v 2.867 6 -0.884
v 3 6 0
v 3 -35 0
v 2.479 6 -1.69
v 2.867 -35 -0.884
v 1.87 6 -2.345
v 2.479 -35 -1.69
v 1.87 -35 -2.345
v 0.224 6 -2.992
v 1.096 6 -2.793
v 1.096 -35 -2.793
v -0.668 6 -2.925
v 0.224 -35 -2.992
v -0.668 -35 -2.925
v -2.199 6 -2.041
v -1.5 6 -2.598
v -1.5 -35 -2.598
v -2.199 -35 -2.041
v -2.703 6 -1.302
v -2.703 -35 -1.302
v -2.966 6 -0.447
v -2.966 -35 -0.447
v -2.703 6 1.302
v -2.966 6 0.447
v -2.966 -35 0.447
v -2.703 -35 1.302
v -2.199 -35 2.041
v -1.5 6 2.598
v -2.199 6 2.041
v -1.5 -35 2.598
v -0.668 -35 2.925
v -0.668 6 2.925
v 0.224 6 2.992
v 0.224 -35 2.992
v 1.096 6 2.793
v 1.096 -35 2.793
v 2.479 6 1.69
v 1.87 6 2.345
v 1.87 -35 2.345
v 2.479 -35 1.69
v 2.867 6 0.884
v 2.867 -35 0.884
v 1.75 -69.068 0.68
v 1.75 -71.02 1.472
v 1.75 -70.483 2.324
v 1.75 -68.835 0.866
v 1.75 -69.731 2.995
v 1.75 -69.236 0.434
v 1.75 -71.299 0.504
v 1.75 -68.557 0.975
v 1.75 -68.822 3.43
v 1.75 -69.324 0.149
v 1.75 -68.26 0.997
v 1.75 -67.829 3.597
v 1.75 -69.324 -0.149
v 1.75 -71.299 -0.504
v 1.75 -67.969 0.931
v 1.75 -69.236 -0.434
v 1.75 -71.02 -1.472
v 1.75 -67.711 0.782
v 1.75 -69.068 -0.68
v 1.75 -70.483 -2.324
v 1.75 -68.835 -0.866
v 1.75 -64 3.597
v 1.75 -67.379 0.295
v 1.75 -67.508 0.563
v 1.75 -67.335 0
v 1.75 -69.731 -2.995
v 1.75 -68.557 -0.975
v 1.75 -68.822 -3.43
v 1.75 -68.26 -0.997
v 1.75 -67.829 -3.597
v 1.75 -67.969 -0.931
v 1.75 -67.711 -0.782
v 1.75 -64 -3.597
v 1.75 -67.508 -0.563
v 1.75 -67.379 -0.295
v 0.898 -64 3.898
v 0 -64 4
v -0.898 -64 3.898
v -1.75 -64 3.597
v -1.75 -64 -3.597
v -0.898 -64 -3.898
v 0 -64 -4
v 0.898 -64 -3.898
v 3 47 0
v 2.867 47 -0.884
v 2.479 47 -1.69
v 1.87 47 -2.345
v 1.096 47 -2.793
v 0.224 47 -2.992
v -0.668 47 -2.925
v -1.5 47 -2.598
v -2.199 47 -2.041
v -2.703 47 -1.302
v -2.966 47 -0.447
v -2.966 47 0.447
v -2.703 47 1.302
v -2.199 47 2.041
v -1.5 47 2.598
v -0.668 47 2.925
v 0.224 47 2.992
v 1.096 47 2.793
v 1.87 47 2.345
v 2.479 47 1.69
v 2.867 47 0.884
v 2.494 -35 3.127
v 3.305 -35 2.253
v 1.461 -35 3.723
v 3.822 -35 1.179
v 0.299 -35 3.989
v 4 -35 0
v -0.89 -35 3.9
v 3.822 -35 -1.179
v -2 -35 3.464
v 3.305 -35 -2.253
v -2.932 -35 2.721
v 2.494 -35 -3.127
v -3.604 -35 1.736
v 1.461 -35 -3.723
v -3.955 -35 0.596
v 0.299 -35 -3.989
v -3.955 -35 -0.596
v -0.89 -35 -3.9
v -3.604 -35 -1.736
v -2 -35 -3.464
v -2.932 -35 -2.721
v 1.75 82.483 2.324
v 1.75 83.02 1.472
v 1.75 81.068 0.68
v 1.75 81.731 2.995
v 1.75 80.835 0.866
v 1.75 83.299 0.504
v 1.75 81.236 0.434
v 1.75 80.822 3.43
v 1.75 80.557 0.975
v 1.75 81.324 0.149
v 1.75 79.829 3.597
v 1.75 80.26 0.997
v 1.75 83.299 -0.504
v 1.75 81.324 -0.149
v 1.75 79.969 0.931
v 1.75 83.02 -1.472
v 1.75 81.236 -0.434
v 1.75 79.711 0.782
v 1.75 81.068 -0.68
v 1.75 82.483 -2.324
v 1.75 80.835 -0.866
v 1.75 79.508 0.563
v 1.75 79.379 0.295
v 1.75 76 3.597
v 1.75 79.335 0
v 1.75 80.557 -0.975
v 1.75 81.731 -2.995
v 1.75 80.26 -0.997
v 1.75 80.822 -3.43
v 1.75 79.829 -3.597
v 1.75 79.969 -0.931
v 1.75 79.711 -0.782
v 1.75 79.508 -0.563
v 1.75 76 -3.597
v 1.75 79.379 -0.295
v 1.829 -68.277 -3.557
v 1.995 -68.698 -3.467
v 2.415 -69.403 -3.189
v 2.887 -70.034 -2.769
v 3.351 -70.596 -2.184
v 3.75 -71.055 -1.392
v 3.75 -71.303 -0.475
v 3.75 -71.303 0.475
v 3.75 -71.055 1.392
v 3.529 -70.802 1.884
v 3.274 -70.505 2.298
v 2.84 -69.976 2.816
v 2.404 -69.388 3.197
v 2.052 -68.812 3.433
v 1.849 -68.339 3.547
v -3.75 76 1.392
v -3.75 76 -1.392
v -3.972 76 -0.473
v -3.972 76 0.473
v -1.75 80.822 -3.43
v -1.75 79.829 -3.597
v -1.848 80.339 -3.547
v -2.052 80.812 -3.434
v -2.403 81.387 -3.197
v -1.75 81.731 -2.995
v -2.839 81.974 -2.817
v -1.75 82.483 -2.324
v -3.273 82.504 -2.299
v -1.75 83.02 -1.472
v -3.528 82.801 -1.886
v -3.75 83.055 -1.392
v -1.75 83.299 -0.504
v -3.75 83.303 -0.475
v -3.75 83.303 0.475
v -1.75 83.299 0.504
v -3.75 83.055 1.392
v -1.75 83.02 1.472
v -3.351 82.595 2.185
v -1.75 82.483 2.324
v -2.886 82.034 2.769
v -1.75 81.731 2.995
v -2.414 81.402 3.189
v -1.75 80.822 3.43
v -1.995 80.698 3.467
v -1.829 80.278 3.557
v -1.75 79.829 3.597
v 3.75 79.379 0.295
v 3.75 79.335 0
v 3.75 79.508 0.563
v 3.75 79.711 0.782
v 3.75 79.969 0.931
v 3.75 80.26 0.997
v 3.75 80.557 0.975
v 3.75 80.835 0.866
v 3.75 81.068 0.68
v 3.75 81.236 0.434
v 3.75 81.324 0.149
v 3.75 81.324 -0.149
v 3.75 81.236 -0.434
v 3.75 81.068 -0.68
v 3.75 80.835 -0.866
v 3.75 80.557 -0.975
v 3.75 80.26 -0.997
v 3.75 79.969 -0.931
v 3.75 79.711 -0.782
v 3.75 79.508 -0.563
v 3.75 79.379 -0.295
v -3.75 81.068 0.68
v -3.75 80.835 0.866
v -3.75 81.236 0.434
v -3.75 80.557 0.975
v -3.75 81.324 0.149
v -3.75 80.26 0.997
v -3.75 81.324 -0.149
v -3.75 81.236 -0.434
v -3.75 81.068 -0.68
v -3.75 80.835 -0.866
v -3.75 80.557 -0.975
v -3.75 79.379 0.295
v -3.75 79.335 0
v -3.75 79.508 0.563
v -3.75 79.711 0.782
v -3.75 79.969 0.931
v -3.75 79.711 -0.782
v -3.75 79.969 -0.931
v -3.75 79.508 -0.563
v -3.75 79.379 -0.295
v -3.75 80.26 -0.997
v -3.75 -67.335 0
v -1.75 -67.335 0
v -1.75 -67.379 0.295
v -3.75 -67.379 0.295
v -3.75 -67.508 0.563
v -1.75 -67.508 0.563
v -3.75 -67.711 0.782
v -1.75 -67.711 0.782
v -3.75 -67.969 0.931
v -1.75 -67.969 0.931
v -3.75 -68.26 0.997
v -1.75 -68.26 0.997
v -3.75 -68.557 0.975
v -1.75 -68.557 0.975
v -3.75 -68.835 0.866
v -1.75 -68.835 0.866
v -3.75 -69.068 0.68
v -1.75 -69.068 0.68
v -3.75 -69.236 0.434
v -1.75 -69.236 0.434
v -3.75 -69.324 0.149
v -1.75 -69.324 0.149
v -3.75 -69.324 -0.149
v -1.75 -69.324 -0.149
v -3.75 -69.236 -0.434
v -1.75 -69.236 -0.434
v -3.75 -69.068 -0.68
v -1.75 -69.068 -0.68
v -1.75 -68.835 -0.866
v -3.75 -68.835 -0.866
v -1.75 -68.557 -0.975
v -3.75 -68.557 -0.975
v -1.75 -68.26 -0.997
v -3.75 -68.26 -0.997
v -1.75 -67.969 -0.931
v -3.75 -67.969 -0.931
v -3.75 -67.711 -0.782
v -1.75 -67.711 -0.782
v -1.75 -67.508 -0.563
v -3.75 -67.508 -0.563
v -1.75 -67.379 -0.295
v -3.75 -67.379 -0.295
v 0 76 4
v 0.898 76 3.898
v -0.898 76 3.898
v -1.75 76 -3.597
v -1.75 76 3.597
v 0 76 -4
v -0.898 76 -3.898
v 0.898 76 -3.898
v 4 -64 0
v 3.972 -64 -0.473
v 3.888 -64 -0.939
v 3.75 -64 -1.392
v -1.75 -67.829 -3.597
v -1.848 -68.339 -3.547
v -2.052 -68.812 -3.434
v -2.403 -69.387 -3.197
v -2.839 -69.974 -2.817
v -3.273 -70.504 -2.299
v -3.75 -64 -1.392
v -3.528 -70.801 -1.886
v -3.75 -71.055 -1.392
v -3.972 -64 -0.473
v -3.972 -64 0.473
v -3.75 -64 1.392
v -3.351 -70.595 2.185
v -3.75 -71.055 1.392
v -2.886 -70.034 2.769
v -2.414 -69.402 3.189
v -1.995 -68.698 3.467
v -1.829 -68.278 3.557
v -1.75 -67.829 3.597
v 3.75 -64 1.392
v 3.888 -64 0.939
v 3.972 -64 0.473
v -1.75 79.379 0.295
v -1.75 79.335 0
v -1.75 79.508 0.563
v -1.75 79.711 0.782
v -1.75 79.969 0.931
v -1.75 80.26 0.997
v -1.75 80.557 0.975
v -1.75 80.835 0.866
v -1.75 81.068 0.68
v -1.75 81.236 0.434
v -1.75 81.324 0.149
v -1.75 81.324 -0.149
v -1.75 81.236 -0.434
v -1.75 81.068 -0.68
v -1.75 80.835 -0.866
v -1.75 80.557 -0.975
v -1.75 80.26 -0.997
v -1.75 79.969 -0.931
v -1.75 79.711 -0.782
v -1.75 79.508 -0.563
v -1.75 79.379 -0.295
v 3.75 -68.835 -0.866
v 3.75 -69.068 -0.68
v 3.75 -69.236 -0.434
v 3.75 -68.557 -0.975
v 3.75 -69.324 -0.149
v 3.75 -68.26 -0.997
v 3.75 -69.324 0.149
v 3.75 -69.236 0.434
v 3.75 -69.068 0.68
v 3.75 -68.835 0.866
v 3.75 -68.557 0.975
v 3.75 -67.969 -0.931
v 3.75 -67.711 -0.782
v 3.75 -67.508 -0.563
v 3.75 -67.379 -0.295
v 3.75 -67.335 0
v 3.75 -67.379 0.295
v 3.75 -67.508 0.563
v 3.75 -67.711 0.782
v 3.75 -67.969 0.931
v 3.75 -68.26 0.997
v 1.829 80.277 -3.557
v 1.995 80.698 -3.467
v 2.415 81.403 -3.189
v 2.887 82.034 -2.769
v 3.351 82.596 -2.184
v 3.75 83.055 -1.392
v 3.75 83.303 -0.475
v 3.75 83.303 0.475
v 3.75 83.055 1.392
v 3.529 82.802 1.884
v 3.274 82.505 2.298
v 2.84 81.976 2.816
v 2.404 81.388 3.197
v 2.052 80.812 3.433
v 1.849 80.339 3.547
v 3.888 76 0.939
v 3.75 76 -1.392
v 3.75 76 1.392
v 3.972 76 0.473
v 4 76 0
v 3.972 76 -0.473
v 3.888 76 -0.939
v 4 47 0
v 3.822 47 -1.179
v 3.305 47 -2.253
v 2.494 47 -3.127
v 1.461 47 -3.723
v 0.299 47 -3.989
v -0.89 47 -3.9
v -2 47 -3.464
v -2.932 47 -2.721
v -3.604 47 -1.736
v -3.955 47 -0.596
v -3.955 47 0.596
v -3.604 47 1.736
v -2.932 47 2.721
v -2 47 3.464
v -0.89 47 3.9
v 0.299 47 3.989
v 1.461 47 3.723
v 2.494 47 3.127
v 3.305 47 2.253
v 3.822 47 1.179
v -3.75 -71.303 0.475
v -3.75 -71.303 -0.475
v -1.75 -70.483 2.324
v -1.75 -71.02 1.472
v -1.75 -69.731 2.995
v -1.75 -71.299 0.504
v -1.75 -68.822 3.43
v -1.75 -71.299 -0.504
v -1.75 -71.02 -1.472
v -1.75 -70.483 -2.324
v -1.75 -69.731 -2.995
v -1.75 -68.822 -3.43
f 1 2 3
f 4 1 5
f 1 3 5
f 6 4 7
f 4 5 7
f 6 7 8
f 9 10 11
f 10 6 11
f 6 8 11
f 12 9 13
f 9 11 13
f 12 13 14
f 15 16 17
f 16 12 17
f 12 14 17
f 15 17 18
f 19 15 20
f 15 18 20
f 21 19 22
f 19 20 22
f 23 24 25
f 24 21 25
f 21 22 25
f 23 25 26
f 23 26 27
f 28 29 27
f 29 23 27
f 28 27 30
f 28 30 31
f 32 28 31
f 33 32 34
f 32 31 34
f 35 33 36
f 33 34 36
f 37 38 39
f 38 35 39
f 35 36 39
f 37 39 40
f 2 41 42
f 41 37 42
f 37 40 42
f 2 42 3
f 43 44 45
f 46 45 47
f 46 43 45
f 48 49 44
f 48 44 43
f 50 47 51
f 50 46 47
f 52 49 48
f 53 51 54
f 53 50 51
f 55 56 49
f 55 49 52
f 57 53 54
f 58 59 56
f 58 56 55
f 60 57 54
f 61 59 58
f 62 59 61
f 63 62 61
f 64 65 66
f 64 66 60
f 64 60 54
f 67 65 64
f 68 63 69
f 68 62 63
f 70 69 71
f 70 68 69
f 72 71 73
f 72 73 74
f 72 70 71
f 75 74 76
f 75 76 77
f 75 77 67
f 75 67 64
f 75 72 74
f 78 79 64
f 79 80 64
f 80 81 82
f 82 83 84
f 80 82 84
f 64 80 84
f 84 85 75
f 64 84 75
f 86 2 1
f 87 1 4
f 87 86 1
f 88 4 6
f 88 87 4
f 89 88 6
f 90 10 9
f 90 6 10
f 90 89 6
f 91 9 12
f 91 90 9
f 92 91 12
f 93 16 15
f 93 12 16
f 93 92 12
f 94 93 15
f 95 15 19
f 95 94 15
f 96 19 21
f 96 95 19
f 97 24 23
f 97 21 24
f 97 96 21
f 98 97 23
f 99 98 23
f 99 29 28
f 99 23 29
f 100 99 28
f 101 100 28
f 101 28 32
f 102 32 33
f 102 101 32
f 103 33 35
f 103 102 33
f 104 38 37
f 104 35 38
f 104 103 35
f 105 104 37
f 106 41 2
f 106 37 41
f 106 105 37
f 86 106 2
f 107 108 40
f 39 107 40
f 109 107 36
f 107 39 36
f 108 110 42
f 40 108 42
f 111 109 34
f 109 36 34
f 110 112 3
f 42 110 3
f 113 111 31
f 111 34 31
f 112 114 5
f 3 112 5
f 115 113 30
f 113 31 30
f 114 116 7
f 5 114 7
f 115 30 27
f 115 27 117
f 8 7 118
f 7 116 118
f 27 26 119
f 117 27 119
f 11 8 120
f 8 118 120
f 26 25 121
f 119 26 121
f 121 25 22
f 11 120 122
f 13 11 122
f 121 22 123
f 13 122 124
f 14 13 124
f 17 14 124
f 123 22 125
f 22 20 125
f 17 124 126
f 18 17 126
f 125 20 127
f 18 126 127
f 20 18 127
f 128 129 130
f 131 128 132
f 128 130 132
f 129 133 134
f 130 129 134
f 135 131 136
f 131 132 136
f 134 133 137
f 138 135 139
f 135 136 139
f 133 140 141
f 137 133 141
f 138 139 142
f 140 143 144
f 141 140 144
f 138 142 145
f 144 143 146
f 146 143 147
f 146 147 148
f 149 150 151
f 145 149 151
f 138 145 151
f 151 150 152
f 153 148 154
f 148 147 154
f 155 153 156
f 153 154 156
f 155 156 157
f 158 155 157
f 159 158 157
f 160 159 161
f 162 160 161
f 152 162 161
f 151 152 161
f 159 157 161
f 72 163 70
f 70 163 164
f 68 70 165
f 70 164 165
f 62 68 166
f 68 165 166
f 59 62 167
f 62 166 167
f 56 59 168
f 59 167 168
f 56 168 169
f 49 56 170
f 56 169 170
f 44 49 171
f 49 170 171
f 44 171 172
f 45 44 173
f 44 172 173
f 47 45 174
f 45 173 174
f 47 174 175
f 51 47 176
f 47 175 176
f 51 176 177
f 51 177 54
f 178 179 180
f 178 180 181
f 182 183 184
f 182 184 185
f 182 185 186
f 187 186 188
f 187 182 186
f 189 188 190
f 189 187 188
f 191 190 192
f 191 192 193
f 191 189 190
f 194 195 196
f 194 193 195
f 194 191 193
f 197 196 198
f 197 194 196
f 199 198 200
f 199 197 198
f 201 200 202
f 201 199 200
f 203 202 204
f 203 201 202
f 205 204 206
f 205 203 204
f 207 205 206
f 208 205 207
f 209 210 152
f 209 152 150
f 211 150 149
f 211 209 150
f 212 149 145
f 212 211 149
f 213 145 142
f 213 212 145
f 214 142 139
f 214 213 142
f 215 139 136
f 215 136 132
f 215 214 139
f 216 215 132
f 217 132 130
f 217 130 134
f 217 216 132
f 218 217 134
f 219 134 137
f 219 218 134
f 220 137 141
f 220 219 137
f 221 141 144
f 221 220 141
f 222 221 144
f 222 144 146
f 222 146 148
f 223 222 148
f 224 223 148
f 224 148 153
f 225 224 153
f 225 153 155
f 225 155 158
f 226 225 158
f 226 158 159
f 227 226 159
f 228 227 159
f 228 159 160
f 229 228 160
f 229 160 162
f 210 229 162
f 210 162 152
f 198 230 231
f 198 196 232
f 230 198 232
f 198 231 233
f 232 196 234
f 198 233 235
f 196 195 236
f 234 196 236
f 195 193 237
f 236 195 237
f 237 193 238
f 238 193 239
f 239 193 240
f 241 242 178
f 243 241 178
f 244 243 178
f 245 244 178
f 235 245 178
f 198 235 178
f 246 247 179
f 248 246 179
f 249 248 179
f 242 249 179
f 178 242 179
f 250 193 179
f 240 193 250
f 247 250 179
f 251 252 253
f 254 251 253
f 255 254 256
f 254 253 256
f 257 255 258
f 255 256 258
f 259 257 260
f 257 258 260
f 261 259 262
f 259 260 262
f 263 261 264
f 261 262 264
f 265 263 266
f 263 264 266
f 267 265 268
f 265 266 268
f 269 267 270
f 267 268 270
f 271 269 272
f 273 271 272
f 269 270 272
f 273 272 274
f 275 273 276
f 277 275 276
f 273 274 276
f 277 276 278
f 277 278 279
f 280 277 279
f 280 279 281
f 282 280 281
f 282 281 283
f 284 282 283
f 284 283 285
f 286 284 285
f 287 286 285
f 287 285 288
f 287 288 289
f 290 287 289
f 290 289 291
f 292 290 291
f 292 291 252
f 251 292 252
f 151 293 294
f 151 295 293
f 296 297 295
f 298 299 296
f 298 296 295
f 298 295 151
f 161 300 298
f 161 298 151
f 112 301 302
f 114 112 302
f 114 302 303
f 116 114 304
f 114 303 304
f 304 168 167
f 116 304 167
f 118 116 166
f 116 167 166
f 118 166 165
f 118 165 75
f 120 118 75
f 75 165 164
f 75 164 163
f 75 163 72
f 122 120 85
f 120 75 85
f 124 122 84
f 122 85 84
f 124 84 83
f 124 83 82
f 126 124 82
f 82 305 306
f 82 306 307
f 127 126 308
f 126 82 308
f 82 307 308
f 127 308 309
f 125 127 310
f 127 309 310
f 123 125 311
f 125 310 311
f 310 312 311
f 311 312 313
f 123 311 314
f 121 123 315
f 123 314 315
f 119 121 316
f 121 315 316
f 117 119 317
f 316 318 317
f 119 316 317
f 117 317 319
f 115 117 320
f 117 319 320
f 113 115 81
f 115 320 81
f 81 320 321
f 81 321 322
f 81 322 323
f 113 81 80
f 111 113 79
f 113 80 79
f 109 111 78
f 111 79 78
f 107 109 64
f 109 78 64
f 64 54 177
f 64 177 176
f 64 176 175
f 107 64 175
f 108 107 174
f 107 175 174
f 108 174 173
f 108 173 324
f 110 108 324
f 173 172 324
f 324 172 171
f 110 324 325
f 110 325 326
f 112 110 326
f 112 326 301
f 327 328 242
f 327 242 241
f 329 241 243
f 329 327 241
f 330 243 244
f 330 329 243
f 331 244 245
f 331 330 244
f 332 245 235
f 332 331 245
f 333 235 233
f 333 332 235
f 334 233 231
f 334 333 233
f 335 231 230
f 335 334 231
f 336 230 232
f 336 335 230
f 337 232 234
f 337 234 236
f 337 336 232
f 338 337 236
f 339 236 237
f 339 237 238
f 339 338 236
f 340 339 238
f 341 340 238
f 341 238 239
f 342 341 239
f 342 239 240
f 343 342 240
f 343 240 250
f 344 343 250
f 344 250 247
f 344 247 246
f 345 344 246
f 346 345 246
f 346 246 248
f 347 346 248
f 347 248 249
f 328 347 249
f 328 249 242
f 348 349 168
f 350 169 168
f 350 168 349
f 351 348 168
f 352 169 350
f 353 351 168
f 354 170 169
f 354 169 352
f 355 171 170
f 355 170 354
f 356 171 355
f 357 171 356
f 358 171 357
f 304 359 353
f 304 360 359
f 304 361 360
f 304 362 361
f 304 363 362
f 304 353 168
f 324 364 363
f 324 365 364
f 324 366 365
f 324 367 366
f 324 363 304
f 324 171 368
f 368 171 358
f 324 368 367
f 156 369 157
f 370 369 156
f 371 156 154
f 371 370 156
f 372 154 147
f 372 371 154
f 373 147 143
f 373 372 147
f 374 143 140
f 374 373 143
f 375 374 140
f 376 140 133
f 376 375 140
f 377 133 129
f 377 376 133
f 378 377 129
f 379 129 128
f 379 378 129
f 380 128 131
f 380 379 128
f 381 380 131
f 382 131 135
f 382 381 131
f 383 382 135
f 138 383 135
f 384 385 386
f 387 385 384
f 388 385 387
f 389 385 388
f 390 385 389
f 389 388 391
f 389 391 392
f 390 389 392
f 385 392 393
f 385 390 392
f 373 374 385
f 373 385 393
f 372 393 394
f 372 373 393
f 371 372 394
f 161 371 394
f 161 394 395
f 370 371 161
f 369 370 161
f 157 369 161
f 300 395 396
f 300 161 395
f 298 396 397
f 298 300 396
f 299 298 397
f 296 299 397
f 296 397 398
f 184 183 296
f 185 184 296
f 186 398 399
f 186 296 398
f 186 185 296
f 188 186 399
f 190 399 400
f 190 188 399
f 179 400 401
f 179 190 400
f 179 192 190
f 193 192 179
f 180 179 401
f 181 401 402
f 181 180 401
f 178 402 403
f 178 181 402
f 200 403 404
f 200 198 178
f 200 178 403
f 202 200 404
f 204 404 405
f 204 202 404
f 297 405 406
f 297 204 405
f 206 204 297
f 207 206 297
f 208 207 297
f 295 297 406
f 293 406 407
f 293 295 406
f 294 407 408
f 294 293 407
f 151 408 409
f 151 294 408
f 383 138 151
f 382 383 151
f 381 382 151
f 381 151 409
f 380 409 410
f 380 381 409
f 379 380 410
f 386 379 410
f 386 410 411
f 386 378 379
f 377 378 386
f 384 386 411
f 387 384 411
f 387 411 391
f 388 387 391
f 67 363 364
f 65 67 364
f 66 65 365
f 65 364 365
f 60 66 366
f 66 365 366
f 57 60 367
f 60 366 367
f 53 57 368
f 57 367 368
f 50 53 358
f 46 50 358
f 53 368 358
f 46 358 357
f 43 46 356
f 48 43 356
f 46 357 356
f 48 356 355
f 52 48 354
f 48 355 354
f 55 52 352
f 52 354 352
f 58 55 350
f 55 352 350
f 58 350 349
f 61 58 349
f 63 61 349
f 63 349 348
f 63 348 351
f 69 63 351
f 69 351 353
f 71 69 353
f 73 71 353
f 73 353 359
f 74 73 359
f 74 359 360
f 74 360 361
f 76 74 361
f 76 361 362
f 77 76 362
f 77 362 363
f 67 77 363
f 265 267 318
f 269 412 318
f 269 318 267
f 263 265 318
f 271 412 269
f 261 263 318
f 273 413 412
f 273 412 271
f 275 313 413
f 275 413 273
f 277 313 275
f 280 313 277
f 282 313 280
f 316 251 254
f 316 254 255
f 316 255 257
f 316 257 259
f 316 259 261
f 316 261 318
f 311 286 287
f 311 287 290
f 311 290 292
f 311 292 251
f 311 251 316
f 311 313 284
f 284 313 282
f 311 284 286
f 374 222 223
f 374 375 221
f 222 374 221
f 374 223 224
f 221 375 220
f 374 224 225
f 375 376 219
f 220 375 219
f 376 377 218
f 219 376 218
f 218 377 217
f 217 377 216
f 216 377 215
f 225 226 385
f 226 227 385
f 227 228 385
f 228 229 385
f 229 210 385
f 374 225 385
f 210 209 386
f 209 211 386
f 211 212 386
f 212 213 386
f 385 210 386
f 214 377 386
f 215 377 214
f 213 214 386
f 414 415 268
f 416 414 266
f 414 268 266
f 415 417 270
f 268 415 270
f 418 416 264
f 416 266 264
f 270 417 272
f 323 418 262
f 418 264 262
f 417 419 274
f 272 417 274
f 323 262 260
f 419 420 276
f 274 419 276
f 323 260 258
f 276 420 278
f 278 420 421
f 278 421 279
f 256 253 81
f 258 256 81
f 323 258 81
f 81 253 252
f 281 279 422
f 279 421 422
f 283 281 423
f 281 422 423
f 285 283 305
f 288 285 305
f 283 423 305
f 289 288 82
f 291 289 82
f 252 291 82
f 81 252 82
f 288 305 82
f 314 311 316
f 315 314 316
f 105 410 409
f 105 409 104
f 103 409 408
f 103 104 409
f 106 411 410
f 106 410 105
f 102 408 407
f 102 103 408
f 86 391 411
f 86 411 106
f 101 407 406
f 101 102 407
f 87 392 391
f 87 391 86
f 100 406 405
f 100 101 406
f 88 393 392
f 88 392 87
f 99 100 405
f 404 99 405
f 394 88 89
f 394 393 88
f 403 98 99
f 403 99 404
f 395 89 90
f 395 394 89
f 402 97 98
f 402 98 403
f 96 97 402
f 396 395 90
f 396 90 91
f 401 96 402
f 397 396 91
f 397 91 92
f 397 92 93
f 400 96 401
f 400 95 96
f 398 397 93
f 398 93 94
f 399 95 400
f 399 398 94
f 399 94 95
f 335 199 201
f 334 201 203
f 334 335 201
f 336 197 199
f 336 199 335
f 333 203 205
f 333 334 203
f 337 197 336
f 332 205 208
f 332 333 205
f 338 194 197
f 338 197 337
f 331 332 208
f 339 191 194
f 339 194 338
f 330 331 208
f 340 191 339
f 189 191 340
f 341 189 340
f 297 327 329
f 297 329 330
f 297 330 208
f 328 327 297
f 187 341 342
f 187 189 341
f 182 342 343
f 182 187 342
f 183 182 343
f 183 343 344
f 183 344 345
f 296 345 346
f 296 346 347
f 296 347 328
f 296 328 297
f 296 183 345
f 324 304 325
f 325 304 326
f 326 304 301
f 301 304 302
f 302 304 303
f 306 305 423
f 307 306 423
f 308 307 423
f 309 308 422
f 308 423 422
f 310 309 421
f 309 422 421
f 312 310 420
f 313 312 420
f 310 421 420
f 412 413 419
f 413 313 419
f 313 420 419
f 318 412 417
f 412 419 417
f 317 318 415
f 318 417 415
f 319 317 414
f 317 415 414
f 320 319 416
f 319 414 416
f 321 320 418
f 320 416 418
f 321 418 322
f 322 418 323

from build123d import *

# Parameters (mm, degrees)
SKETCH2_W               = 3.5
SKETCH2_H               = 22
SKETCH2_W_2             = 3.489149722
SKETCH2_H_2             = 10.808558849
SKETCH2_W_3             = 5.104041679
SKETCH2_H_3             = 8.66936491
CUT_EXTRUDE1_DEPTH      = 10
SKETCH3_R               = 1
CUT_EXTRUDE2_DEPTH      = 1.25
CUT_EXTRUDE2_DEPTH_BACK = 8.75
CUT_EXTRUDE3_DEPTH      = 1.25
CUT_EXTRUDE3_DEPTH_BACK = 8.75


with BuildPart() as part:
    # Sketch1 → Revolve1 (revolve)
    with BuildSketch(Plane.XY, mode=Mode.PRIVATE) as revolve1_sk:
        Polygon((0, -75), (0, 75), (-3, 75), (-3, -35), (-4, -35), (-4, -75), align=None)
    revolve(revolve1_sk.sketch.rotate(Axis((0, -75, 0), (0, 1, 0)), 180), axis=Axis((0, -75, 0), (0, 1, 0)))  # turned: the seam where the file's is

    # Sketch2 → Cut-Extrude1 (cut, symmetric)
    with BuildSketch(Plane.XY):
        with Locations((0, -75)):
            Rectangle(SKETCH2_W, SKETCH2_H)
        with Locations((-5.494574861, -69.404279425)):
            Rectangle(SKETCH2_W_2, SKETCH2_H_2)
        with Locations((6.302020839, -68.334682455)):
            Rectangle(SKETCH2_W_3, SKETCH2_H_3)
    extrude(amount=CUT_EXTRUDE1_DEPTH, both=True, mode=Mode.SUBTRACT)

    # Sketch3 → Cut-Extrude2 (cut, two sides)
    with BuildSketch(Plane(origin=(3.75, 0, 0), x_dir=(0, 0, -1), z_dir=(1, 0, 0))) as cut_extrude2_sk:
        with Locations(Location((0, -68.334682455, 0), (0, 0, 90))):  # turned: the seam where the file's is
            Circle(SKETCH3_R)
    extrude(amount=CUT_EXTRUDE2_DEPTH, mode=Mode.SUBTRACT)
    extrude(cut_extrude2_sk.sketch, amount=-CUT_EXTRUDE2_DEPTH_BACK, mode=Mode.SUBTRACT)

    # Sketch4 → Cut-Extrude3 (cut, two sides)
    with BuildSketch(Plane(origin=(3.75, 0, 0), x_dir=(0, 0, -1), z_dir=(1, 0, 0))) as cut_extrude3_sk:
        with BuildLine():
            Line((-3.596873642, -67.828802158), (-5.675638146, -67.828802158))
            Line((-5.675638146, -67.828802158), (-5.675638146, -76.926900892))
            Line((-5.675638146, -76.926900892), (6.407188639, -76.926900892))
            Line((6.407188639, -76.926900892), (6.407188639, -67.828802158))
            Line((6.407188639, -67.828802158), (3.596873642, -67.828802158))
            ThreePointArc((3.596873642, -67.828802158), (0, -71.334682455), (-3.596873642, -67.828802158))
        make_face()
    extrude(amount=CUT_EXTRUDE3_DEPTH, mode=Mode.SUBTRACT)
    extrude(cut_extrude3_sk.sketch, amount=-CUT_EXTRUDE3_DEPTH_BACK, mode=Mode.SUBTRACT)

    # Split1
    split(bisect_by=Plane.ZX.offset(6), keep=Keep.BOTTOM)

    # Mirror1: part across plane


with BuildPart() as part_1:
    add(part.part)
    add(part.part.mirror(Plane.ZX.offset(6)))


solid = part_1.part
